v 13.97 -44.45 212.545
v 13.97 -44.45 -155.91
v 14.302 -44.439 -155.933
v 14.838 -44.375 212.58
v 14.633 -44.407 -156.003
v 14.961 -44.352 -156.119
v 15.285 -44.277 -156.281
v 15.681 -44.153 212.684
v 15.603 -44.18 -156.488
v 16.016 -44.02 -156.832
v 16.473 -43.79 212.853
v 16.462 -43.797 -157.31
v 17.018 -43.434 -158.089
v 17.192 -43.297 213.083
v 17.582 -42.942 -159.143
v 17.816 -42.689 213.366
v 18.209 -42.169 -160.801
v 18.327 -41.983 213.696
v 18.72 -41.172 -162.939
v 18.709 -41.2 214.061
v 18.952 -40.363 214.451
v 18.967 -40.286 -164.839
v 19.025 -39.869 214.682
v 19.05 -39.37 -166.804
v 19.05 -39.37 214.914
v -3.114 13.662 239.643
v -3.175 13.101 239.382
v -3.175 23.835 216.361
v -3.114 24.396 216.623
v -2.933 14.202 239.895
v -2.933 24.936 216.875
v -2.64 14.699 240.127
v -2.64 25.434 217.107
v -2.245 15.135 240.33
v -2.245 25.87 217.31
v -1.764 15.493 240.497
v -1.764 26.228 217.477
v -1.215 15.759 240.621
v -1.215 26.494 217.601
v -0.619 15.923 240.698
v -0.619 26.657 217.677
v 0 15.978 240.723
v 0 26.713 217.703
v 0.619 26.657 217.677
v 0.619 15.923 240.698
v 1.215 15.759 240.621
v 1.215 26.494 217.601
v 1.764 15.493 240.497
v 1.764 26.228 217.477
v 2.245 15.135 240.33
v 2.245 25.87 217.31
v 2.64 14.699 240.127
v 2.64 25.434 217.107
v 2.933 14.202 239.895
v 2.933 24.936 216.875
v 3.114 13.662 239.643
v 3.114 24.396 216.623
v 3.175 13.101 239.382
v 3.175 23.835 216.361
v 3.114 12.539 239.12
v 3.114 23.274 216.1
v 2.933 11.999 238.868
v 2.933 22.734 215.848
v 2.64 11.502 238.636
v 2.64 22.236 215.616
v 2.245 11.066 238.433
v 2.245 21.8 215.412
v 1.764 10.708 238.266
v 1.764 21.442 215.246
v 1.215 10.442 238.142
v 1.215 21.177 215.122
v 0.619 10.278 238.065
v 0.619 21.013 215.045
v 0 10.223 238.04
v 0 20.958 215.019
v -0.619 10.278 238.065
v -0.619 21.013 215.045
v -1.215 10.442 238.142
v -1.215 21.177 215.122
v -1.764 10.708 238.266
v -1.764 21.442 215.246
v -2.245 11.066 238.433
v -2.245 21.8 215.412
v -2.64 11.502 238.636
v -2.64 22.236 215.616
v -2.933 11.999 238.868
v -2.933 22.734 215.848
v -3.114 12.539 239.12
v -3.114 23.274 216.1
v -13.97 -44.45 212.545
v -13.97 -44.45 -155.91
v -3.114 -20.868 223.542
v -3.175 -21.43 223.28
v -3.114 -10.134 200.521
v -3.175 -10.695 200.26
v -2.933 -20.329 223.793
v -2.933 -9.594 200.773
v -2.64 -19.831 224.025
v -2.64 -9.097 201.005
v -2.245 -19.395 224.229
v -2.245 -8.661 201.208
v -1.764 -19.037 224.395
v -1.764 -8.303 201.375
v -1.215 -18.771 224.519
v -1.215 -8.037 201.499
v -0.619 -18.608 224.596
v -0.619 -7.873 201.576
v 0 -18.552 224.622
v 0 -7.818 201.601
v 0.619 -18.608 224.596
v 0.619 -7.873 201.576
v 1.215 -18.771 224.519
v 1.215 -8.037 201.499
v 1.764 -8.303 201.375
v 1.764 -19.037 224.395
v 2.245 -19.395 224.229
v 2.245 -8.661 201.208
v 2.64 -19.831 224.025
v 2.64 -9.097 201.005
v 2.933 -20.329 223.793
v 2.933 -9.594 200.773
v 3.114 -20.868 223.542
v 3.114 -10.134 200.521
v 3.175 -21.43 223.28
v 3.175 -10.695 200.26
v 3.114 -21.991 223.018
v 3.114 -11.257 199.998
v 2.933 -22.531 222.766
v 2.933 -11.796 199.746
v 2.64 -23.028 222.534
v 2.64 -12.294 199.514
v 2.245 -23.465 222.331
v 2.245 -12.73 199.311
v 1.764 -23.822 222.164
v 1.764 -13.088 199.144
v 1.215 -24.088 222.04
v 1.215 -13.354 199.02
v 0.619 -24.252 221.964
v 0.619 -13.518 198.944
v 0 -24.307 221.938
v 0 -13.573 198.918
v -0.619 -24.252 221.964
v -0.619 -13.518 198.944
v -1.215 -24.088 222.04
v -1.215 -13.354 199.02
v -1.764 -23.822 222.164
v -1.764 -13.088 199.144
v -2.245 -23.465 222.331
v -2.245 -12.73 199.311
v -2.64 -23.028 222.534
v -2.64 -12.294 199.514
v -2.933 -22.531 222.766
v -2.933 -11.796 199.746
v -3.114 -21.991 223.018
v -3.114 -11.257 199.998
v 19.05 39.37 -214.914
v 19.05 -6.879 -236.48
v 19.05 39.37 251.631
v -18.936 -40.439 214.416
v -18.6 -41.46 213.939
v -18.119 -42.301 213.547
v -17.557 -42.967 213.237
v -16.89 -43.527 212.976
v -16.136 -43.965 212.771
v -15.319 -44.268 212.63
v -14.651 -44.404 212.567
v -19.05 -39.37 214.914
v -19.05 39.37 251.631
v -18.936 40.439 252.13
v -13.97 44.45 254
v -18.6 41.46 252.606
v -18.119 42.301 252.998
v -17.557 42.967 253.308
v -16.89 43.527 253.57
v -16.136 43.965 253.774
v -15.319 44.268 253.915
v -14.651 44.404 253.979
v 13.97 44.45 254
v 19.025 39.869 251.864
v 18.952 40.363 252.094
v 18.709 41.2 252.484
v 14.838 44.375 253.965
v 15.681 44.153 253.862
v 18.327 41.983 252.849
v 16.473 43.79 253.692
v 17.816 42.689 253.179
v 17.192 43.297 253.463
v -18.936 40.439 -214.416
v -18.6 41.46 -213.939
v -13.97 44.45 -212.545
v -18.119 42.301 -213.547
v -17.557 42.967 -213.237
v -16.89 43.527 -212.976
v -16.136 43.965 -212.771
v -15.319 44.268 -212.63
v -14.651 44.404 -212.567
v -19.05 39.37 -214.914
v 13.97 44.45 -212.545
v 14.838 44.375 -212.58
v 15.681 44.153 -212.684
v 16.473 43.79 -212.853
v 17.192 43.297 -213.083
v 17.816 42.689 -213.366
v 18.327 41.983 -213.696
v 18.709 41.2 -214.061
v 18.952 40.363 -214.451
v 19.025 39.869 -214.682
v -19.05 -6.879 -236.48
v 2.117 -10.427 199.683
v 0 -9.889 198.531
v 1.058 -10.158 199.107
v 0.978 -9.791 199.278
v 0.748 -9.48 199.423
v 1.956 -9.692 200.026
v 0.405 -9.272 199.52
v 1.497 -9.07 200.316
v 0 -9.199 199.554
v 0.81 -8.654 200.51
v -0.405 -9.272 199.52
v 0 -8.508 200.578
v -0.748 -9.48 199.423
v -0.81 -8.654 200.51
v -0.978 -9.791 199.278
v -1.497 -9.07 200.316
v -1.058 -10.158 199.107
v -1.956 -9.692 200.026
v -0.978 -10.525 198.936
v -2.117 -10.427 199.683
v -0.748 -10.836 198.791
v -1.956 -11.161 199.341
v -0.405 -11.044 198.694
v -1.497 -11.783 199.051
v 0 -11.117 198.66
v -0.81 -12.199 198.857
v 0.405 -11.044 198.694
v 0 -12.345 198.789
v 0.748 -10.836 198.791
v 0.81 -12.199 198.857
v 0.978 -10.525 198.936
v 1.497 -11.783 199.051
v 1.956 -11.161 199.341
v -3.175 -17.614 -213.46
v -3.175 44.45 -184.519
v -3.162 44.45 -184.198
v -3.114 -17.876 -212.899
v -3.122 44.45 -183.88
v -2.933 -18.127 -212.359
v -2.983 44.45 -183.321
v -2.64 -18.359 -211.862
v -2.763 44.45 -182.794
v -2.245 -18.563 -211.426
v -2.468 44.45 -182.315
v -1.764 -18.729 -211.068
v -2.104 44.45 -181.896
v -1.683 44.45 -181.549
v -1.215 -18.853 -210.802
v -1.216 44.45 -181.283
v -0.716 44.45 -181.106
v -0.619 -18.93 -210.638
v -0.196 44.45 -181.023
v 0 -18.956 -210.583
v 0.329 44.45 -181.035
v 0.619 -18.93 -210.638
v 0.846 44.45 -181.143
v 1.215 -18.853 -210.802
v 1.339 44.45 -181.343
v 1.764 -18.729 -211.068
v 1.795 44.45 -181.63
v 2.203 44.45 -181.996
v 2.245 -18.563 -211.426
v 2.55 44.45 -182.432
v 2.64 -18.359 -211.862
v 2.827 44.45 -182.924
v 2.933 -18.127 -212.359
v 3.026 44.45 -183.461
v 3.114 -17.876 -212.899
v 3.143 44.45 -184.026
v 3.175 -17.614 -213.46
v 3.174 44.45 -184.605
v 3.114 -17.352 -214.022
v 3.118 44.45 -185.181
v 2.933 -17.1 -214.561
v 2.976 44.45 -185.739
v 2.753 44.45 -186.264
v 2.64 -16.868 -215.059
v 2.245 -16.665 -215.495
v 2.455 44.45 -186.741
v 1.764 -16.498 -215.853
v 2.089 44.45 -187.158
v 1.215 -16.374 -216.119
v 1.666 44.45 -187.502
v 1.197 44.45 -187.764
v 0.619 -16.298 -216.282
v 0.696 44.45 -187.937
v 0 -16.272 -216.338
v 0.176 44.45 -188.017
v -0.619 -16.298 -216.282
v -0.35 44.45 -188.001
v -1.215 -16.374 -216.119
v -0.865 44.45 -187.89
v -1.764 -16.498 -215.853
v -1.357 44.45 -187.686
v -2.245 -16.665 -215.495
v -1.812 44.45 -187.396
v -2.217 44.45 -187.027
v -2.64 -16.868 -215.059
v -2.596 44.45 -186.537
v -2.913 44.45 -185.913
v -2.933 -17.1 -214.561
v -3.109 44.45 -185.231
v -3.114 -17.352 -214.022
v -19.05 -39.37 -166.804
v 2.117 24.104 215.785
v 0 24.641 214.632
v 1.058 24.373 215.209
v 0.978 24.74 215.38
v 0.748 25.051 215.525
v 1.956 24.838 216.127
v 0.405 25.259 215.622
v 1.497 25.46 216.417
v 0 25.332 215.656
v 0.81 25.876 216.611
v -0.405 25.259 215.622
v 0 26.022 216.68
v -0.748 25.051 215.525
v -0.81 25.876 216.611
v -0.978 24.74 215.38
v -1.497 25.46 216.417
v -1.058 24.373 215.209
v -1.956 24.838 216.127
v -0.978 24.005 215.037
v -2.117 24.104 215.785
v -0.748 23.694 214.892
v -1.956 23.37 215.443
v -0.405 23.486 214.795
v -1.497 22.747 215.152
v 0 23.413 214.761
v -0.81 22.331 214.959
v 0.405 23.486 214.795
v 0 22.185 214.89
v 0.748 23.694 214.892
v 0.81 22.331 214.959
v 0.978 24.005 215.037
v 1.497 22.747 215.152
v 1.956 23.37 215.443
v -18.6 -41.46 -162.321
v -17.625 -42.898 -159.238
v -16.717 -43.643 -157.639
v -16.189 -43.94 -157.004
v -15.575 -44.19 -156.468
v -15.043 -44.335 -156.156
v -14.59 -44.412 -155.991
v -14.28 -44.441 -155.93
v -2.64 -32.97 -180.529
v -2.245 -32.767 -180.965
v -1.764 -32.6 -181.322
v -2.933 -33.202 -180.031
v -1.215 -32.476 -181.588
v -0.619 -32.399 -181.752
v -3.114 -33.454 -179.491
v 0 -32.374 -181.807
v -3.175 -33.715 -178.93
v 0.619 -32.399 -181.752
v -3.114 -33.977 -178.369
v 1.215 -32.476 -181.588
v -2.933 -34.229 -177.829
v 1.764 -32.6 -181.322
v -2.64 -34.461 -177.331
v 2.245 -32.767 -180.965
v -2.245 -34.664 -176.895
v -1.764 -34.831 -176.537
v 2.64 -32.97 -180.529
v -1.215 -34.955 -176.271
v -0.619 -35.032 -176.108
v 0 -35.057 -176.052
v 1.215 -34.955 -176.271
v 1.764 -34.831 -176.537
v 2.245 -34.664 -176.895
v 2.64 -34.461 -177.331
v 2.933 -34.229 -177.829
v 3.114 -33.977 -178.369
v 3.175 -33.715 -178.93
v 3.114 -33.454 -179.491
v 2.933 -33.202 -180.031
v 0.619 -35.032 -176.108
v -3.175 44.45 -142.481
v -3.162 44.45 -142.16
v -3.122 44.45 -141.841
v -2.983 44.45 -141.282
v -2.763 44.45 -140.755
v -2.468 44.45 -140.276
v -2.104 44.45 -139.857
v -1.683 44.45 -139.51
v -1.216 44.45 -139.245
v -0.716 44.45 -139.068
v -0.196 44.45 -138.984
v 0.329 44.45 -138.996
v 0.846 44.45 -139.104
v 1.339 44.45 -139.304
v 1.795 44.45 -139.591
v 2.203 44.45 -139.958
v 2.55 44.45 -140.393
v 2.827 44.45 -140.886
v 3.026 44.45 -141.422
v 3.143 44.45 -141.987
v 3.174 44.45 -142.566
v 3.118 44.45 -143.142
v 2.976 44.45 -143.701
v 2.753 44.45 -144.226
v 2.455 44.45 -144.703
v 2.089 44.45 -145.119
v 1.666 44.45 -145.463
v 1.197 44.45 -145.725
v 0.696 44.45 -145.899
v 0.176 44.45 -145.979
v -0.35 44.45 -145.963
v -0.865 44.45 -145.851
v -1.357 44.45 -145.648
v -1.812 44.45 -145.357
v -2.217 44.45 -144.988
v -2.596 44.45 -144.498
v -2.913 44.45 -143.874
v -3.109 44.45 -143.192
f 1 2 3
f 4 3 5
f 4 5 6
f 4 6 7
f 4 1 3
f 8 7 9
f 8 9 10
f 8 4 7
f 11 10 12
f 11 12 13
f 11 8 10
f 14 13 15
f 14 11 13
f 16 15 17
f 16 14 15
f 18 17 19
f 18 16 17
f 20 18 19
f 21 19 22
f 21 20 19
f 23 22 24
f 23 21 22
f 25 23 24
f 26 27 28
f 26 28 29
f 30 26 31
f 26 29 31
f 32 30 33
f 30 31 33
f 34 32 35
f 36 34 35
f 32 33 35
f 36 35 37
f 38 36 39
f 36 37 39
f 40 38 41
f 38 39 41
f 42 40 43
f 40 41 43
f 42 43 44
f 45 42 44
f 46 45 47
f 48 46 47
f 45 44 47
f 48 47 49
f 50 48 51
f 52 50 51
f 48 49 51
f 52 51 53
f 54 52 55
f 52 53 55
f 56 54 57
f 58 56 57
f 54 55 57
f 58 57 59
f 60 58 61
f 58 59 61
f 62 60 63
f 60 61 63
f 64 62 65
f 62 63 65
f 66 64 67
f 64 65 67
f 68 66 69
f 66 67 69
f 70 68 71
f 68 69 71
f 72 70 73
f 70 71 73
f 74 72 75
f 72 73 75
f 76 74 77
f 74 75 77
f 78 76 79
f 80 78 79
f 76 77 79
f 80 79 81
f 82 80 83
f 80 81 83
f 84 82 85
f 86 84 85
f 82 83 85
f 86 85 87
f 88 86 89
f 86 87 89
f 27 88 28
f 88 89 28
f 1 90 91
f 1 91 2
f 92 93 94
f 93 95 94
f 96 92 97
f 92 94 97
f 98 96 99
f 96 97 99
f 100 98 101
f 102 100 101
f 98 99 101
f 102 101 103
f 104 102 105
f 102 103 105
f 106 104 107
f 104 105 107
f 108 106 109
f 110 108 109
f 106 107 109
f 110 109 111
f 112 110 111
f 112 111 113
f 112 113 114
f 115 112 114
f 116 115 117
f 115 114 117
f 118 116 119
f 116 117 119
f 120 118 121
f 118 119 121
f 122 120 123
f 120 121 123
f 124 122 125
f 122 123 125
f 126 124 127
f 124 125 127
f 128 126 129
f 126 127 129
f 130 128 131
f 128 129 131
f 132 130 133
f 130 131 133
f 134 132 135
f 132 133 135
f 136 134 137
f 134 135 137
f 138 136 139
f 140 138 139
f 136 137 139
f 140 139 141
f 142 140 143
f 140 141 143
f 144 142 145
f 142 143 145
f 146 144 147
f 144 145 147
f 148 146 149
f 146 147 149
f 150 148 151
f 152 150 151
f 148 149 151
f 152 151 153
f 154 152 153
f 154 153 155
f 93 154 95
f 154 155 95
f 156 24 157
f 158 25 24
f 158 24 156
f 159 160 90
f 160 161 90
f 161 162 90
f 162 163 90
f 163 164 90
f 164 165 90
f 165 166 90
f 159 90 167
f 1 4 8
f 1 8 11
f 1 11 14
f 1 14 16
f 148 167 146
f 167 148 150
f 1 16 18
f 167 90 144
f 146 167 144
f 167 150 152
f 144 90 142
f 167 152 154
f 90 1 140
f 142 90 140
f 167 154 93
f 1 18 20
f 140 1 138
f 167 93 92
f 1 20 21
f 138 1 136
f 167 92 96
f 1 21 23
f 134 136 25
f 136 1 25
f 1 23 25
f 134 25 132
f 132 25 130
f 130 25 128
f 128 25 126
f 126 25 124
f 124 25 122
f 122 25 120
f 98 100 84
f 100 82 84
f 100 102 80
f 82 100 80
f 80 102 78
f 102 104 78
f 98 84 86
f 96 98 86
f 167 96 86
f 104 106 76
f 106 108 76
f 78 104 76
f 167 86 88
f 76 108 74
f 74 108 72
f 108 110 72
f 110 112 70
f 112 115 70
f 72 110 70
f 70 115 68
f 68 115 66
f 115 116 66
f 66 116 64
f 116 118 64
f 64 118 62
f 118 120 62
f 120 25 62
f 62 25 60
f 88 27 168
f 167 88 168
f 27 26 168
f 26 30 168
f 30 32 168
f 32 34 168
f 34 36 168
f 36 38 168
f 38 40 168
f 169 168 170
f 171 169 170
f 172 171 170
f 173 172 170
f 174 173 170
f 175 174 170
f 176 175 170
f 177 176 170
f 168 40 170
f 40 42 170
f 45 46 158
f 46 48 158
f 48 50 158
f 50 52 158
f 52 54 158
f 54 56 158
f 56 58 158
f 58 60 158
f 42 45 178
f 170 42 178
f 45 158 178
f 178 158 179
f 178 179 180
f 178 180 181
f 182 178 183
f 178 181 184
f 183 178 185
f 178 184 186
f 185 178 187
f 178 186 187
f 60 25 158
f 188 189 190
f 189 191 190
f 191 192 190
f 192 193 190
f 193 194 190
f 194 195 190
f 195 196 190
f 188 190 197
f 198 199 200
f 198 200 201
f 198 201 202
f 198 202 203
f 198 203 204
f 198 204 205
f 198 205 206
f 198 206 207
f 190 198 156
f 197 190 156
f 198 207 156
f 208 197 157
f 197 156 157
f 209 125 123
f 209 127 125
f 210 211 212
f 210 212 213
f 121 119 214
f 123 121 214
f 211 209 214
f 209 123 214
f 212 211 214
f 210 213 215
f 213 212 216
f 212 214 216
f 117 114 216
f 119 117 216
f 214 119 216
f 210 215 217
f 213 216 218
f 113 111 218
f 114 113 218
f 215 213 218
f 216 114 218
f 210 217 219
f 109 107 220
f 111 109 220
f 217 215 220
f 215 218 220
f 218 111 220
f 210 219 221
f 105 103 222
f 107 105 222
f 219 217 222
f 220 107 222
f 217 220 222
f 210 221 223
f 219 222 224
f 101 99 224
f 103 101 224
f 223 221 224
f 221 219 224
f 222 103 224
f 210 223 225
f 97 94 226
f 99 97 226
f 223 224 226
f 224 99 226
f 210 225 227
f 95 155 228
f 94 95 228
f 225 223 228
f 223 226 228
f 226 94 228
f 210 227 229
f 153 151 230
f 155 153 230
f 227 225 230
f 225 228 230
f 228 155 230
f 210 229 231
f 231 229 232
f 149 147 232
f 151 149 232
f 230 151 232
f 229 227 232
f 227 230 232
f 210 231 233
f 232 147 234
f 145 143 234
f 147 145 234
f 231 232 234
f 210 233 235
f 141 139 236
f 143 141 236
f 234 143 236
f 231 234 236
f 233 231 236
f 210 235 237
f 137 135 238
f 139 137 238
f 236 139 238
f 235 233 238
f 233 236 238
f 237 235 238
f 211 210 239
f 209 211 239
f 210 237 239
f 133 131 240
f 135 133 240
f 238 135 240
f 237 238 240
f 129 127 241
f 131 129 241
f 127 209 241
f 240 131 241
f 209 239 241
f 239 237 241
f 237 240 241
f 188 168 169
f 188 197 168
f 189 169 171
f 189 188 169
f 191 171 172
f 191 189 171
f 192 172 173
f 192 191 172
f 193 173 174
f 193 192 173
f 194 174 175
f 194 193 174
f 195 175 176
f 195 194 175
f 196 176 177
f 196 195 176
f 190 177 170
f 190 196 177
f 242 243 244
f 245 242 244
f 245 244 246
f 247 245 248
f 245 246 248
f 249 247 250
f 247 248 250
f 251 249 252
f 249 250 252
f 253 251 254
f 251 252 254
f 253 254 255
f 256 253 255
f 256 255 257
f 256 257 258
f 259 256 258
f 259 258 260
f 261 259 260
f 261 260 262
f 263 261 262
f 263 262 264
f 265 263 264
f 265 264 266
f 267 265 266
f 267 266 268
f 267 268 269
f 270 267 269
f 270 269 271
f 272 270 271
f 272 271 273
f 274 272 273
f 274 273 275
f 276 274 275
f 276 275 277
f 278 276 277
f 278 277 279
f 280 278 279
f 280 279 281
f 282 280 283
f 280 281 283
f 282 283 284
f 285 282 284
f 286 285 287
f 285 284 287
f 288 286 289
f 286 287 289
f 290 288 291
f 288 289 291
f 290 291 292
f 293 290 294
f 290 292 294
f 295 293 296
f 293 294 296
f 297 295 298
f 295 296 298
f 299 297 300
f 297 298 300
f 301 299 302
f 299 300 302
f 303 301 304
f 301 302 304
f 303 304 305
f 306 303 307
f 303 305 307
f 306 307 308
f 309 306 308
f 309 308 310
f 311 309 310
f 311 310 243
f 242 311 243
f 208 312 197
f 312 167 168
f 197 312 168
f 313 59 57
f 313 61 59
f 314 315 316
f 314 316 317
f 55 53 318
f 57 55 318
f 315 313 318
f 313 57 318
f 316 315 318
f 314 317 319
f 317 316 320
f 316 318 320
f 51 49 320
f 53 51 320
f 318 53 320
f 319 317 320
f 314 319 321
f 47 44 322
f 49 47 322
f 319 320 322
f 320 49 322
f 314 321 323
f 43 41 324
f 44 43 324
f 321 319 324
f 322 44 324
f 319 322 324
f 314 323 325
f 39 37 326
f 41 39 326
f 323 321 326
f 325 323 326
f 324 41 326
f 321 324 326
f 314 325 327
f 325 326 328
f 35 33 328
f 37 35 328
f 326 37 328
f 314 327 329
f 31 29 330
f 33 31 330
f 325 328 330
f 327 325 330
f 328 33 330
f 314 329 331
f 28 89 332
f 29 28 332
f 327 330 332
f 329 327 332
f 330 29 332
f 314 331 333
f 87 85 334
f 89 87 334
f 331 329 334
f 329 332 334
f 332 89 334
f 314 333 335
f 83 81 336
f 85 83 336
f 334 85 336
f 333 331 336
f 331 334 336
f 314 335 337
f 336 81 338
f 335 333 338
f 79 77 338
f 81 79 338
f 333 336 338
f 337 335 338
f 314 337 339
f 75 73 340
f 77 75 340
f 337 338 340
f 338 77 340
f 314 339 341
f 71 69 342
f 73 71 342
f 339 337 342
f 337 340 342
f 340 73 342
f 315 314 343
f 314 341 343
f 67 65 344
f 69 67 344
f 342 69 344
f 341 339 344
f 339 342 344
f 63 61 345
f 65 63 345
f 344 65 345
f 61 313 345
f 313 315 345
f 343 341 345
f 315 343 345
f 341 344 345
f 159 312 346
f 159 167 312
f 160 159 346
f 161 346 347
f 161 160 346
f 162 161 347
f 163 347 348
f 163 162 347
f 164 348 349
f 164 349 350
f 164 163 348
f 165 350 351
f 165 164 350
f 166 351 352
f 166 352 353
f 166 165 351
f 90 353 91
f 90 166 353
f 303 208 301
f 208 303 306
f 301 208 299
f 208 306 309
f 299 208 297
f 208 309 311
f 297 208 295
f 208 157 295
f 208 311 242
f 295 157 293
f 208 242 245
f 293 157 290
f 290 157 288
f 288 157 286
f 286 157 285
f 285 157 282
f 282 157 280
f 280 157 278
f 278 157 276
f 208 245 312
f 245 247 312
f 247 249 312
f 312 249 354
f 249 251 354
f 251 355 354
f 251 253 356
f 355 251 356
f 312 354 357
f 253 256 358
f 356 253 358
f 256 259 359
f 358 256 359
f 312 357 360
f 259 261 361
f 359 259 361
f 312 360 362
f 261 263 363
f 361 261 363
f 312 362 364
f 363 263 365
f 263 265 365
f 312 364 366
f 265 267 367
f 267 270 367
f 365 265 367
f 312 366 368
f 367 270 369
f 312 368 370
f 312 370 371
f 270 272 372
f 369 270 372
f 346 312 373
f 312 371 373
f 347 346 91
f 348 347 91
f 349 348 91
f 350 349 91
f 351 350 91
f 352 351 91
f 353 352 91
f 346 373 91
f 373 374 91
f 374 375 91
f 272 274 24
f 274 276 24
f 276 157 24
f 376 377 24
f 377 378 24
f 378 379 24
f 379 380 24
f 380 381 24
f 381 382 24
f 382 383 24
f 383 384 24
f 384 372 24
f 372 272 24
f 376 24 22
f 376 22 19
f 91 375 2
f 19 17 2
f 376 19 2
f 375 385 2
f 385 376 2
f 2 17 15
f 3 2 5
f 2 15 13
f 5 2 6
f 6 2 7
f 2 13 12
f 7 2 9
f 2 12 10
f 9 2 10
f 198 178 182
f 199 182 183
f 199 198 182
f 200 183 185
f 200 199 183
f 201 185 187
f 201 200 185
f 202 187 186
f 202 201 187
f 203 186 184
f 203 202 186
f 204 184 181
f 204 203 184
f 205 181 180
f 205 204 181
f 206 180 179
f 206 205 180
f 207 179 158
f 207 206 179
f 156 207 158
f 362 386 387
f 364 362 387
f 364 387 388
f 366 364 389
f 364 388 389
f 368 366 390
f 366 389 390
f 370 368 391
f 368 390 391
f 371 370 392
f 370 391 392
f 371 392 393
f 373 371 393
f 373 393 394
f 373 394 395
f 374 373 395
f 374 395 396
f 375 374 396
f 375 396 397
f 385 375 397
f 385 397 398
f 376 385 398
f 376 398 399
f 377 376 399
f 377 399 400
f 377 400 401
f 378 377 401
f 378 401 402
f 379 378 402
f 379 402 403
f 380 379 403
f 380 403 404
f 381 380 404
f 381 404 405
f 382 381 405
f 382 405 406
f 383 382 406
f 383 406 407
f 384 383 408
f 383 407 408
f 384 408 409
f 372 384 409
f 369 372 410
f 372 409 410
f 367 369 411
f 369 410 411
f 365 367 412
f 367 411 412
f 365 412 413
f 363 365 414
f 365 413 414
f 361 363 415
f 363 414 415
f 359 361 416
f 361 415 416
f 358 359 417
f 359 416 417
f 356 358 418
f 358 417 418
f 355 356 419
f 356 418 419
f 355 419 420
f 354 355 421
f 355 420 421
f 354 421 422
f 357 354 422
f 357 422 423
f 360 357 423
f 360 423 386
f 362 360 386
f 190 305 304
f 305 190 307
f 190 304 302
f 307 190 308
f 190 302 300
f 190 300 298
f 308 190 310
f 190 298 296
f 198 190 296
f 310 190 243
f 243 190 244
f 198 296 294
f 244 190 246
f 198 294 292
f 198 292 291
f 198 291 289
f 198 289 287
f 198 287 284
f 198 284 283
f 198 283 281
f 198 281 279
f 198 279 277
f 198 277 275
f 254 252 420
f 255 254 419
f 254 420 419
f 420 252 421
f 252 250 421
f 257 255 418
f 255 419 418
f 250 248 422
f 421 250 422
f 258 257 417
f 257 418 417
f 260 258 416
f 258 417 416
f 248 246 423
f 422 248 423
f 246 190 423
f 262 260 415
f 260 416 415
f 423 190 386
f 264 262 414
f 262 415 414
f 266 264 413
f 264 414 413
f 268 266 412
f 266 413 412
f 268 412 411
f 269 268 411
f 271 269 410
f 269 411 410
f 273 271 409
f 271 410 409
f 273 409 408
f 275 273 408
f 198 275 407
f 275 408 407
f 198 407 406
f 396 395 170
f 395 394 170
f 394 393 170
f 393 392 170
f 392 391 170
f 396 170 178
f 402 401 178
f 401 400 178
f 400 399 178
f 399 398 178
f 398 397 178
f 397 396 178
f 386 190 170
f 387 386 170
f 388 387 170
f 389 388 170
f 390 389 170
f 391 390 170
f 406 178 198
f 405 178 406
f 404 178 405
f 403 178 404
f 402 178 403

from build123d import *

# Parameters (mm, degrees)
F0_W     = 38.1
F0_H     = 88.9
F1_DEPTH = 254
F3_DEPTH = 38.101
F5_D     = 6.35
F6_R     = 5.08
F8_D     = 6.35
F8_DEPTH = 25.4
F8_TIP   = 1.9077324654


with BuildPart() as f1:
    # F0 (on Top) → F1 (new body, symmetric)
    with BuildSketch(Plane.XY):
        Rectangle(F0_W, F0_H)
    extrude(amount=F1_DEPTH, both=True)

    # F2 (on face) → F3 (cut, through all)
    with BuildSketch(Plane.YZ.offset(19.05)):
        Polygon((-44.45, 254), (-44.45, 212.54524919), (44.45, 254), align=None)
        Polygon((-6.8792365313, -236.4804652718), (-44.45, -254), (44.45, -254), (44.45, -212.54524919), align=None)
        Polygon((-44.45, -155.9097030042), (-44.45, -254), (-6.8792365313, -236.4804652718), align=None)
    extrude(amount=-F3_DEPTH, mode=Mode.SUBTRACT)

    # F5 (through all)
    with Locations(Plane(origin=(0, -96.2278354326, -44.8717765899), x_dir=(1, 0, 0), z_dir=(0, -0.906307787, -0.4226182617))):
        with Locations((0, -147.9167961729), (0, -186.0167961729)):
            Hole(F5_D / 2)

    # F6
    f6_edges = [f1.edges().sort_by_distance(p)[0] for p in [
        (19.05, -44.45, 28.317773),
        (-19.05, -44.45, 28.317773),
        (19.05, 44.45, 20.727375),
        (-19.05, 44.45, 20.727375),
    ]]
    fillet(f6_edges, radius=F6_R)

    # F8
    with Locations(Plane(origin=(0, -89.3485989014, 191.6086886819), x_dir=(1, 0, 0), z_dir=(0, -0.4226182617, 0.906307787))):
        with Locations((0, 113.0401226202), (0, 74.9401226202)):
            Hole(F8_D / 2, depth=F8_DEPTH)
            with Locations((0, 0, -(F8_DEPTH + F8_TIP / 2))):  # 118° drill point
                Cone(0, F8_D / 2, F8_TIP, mode=Mode.SUBTRACT)


solid = f1.part
